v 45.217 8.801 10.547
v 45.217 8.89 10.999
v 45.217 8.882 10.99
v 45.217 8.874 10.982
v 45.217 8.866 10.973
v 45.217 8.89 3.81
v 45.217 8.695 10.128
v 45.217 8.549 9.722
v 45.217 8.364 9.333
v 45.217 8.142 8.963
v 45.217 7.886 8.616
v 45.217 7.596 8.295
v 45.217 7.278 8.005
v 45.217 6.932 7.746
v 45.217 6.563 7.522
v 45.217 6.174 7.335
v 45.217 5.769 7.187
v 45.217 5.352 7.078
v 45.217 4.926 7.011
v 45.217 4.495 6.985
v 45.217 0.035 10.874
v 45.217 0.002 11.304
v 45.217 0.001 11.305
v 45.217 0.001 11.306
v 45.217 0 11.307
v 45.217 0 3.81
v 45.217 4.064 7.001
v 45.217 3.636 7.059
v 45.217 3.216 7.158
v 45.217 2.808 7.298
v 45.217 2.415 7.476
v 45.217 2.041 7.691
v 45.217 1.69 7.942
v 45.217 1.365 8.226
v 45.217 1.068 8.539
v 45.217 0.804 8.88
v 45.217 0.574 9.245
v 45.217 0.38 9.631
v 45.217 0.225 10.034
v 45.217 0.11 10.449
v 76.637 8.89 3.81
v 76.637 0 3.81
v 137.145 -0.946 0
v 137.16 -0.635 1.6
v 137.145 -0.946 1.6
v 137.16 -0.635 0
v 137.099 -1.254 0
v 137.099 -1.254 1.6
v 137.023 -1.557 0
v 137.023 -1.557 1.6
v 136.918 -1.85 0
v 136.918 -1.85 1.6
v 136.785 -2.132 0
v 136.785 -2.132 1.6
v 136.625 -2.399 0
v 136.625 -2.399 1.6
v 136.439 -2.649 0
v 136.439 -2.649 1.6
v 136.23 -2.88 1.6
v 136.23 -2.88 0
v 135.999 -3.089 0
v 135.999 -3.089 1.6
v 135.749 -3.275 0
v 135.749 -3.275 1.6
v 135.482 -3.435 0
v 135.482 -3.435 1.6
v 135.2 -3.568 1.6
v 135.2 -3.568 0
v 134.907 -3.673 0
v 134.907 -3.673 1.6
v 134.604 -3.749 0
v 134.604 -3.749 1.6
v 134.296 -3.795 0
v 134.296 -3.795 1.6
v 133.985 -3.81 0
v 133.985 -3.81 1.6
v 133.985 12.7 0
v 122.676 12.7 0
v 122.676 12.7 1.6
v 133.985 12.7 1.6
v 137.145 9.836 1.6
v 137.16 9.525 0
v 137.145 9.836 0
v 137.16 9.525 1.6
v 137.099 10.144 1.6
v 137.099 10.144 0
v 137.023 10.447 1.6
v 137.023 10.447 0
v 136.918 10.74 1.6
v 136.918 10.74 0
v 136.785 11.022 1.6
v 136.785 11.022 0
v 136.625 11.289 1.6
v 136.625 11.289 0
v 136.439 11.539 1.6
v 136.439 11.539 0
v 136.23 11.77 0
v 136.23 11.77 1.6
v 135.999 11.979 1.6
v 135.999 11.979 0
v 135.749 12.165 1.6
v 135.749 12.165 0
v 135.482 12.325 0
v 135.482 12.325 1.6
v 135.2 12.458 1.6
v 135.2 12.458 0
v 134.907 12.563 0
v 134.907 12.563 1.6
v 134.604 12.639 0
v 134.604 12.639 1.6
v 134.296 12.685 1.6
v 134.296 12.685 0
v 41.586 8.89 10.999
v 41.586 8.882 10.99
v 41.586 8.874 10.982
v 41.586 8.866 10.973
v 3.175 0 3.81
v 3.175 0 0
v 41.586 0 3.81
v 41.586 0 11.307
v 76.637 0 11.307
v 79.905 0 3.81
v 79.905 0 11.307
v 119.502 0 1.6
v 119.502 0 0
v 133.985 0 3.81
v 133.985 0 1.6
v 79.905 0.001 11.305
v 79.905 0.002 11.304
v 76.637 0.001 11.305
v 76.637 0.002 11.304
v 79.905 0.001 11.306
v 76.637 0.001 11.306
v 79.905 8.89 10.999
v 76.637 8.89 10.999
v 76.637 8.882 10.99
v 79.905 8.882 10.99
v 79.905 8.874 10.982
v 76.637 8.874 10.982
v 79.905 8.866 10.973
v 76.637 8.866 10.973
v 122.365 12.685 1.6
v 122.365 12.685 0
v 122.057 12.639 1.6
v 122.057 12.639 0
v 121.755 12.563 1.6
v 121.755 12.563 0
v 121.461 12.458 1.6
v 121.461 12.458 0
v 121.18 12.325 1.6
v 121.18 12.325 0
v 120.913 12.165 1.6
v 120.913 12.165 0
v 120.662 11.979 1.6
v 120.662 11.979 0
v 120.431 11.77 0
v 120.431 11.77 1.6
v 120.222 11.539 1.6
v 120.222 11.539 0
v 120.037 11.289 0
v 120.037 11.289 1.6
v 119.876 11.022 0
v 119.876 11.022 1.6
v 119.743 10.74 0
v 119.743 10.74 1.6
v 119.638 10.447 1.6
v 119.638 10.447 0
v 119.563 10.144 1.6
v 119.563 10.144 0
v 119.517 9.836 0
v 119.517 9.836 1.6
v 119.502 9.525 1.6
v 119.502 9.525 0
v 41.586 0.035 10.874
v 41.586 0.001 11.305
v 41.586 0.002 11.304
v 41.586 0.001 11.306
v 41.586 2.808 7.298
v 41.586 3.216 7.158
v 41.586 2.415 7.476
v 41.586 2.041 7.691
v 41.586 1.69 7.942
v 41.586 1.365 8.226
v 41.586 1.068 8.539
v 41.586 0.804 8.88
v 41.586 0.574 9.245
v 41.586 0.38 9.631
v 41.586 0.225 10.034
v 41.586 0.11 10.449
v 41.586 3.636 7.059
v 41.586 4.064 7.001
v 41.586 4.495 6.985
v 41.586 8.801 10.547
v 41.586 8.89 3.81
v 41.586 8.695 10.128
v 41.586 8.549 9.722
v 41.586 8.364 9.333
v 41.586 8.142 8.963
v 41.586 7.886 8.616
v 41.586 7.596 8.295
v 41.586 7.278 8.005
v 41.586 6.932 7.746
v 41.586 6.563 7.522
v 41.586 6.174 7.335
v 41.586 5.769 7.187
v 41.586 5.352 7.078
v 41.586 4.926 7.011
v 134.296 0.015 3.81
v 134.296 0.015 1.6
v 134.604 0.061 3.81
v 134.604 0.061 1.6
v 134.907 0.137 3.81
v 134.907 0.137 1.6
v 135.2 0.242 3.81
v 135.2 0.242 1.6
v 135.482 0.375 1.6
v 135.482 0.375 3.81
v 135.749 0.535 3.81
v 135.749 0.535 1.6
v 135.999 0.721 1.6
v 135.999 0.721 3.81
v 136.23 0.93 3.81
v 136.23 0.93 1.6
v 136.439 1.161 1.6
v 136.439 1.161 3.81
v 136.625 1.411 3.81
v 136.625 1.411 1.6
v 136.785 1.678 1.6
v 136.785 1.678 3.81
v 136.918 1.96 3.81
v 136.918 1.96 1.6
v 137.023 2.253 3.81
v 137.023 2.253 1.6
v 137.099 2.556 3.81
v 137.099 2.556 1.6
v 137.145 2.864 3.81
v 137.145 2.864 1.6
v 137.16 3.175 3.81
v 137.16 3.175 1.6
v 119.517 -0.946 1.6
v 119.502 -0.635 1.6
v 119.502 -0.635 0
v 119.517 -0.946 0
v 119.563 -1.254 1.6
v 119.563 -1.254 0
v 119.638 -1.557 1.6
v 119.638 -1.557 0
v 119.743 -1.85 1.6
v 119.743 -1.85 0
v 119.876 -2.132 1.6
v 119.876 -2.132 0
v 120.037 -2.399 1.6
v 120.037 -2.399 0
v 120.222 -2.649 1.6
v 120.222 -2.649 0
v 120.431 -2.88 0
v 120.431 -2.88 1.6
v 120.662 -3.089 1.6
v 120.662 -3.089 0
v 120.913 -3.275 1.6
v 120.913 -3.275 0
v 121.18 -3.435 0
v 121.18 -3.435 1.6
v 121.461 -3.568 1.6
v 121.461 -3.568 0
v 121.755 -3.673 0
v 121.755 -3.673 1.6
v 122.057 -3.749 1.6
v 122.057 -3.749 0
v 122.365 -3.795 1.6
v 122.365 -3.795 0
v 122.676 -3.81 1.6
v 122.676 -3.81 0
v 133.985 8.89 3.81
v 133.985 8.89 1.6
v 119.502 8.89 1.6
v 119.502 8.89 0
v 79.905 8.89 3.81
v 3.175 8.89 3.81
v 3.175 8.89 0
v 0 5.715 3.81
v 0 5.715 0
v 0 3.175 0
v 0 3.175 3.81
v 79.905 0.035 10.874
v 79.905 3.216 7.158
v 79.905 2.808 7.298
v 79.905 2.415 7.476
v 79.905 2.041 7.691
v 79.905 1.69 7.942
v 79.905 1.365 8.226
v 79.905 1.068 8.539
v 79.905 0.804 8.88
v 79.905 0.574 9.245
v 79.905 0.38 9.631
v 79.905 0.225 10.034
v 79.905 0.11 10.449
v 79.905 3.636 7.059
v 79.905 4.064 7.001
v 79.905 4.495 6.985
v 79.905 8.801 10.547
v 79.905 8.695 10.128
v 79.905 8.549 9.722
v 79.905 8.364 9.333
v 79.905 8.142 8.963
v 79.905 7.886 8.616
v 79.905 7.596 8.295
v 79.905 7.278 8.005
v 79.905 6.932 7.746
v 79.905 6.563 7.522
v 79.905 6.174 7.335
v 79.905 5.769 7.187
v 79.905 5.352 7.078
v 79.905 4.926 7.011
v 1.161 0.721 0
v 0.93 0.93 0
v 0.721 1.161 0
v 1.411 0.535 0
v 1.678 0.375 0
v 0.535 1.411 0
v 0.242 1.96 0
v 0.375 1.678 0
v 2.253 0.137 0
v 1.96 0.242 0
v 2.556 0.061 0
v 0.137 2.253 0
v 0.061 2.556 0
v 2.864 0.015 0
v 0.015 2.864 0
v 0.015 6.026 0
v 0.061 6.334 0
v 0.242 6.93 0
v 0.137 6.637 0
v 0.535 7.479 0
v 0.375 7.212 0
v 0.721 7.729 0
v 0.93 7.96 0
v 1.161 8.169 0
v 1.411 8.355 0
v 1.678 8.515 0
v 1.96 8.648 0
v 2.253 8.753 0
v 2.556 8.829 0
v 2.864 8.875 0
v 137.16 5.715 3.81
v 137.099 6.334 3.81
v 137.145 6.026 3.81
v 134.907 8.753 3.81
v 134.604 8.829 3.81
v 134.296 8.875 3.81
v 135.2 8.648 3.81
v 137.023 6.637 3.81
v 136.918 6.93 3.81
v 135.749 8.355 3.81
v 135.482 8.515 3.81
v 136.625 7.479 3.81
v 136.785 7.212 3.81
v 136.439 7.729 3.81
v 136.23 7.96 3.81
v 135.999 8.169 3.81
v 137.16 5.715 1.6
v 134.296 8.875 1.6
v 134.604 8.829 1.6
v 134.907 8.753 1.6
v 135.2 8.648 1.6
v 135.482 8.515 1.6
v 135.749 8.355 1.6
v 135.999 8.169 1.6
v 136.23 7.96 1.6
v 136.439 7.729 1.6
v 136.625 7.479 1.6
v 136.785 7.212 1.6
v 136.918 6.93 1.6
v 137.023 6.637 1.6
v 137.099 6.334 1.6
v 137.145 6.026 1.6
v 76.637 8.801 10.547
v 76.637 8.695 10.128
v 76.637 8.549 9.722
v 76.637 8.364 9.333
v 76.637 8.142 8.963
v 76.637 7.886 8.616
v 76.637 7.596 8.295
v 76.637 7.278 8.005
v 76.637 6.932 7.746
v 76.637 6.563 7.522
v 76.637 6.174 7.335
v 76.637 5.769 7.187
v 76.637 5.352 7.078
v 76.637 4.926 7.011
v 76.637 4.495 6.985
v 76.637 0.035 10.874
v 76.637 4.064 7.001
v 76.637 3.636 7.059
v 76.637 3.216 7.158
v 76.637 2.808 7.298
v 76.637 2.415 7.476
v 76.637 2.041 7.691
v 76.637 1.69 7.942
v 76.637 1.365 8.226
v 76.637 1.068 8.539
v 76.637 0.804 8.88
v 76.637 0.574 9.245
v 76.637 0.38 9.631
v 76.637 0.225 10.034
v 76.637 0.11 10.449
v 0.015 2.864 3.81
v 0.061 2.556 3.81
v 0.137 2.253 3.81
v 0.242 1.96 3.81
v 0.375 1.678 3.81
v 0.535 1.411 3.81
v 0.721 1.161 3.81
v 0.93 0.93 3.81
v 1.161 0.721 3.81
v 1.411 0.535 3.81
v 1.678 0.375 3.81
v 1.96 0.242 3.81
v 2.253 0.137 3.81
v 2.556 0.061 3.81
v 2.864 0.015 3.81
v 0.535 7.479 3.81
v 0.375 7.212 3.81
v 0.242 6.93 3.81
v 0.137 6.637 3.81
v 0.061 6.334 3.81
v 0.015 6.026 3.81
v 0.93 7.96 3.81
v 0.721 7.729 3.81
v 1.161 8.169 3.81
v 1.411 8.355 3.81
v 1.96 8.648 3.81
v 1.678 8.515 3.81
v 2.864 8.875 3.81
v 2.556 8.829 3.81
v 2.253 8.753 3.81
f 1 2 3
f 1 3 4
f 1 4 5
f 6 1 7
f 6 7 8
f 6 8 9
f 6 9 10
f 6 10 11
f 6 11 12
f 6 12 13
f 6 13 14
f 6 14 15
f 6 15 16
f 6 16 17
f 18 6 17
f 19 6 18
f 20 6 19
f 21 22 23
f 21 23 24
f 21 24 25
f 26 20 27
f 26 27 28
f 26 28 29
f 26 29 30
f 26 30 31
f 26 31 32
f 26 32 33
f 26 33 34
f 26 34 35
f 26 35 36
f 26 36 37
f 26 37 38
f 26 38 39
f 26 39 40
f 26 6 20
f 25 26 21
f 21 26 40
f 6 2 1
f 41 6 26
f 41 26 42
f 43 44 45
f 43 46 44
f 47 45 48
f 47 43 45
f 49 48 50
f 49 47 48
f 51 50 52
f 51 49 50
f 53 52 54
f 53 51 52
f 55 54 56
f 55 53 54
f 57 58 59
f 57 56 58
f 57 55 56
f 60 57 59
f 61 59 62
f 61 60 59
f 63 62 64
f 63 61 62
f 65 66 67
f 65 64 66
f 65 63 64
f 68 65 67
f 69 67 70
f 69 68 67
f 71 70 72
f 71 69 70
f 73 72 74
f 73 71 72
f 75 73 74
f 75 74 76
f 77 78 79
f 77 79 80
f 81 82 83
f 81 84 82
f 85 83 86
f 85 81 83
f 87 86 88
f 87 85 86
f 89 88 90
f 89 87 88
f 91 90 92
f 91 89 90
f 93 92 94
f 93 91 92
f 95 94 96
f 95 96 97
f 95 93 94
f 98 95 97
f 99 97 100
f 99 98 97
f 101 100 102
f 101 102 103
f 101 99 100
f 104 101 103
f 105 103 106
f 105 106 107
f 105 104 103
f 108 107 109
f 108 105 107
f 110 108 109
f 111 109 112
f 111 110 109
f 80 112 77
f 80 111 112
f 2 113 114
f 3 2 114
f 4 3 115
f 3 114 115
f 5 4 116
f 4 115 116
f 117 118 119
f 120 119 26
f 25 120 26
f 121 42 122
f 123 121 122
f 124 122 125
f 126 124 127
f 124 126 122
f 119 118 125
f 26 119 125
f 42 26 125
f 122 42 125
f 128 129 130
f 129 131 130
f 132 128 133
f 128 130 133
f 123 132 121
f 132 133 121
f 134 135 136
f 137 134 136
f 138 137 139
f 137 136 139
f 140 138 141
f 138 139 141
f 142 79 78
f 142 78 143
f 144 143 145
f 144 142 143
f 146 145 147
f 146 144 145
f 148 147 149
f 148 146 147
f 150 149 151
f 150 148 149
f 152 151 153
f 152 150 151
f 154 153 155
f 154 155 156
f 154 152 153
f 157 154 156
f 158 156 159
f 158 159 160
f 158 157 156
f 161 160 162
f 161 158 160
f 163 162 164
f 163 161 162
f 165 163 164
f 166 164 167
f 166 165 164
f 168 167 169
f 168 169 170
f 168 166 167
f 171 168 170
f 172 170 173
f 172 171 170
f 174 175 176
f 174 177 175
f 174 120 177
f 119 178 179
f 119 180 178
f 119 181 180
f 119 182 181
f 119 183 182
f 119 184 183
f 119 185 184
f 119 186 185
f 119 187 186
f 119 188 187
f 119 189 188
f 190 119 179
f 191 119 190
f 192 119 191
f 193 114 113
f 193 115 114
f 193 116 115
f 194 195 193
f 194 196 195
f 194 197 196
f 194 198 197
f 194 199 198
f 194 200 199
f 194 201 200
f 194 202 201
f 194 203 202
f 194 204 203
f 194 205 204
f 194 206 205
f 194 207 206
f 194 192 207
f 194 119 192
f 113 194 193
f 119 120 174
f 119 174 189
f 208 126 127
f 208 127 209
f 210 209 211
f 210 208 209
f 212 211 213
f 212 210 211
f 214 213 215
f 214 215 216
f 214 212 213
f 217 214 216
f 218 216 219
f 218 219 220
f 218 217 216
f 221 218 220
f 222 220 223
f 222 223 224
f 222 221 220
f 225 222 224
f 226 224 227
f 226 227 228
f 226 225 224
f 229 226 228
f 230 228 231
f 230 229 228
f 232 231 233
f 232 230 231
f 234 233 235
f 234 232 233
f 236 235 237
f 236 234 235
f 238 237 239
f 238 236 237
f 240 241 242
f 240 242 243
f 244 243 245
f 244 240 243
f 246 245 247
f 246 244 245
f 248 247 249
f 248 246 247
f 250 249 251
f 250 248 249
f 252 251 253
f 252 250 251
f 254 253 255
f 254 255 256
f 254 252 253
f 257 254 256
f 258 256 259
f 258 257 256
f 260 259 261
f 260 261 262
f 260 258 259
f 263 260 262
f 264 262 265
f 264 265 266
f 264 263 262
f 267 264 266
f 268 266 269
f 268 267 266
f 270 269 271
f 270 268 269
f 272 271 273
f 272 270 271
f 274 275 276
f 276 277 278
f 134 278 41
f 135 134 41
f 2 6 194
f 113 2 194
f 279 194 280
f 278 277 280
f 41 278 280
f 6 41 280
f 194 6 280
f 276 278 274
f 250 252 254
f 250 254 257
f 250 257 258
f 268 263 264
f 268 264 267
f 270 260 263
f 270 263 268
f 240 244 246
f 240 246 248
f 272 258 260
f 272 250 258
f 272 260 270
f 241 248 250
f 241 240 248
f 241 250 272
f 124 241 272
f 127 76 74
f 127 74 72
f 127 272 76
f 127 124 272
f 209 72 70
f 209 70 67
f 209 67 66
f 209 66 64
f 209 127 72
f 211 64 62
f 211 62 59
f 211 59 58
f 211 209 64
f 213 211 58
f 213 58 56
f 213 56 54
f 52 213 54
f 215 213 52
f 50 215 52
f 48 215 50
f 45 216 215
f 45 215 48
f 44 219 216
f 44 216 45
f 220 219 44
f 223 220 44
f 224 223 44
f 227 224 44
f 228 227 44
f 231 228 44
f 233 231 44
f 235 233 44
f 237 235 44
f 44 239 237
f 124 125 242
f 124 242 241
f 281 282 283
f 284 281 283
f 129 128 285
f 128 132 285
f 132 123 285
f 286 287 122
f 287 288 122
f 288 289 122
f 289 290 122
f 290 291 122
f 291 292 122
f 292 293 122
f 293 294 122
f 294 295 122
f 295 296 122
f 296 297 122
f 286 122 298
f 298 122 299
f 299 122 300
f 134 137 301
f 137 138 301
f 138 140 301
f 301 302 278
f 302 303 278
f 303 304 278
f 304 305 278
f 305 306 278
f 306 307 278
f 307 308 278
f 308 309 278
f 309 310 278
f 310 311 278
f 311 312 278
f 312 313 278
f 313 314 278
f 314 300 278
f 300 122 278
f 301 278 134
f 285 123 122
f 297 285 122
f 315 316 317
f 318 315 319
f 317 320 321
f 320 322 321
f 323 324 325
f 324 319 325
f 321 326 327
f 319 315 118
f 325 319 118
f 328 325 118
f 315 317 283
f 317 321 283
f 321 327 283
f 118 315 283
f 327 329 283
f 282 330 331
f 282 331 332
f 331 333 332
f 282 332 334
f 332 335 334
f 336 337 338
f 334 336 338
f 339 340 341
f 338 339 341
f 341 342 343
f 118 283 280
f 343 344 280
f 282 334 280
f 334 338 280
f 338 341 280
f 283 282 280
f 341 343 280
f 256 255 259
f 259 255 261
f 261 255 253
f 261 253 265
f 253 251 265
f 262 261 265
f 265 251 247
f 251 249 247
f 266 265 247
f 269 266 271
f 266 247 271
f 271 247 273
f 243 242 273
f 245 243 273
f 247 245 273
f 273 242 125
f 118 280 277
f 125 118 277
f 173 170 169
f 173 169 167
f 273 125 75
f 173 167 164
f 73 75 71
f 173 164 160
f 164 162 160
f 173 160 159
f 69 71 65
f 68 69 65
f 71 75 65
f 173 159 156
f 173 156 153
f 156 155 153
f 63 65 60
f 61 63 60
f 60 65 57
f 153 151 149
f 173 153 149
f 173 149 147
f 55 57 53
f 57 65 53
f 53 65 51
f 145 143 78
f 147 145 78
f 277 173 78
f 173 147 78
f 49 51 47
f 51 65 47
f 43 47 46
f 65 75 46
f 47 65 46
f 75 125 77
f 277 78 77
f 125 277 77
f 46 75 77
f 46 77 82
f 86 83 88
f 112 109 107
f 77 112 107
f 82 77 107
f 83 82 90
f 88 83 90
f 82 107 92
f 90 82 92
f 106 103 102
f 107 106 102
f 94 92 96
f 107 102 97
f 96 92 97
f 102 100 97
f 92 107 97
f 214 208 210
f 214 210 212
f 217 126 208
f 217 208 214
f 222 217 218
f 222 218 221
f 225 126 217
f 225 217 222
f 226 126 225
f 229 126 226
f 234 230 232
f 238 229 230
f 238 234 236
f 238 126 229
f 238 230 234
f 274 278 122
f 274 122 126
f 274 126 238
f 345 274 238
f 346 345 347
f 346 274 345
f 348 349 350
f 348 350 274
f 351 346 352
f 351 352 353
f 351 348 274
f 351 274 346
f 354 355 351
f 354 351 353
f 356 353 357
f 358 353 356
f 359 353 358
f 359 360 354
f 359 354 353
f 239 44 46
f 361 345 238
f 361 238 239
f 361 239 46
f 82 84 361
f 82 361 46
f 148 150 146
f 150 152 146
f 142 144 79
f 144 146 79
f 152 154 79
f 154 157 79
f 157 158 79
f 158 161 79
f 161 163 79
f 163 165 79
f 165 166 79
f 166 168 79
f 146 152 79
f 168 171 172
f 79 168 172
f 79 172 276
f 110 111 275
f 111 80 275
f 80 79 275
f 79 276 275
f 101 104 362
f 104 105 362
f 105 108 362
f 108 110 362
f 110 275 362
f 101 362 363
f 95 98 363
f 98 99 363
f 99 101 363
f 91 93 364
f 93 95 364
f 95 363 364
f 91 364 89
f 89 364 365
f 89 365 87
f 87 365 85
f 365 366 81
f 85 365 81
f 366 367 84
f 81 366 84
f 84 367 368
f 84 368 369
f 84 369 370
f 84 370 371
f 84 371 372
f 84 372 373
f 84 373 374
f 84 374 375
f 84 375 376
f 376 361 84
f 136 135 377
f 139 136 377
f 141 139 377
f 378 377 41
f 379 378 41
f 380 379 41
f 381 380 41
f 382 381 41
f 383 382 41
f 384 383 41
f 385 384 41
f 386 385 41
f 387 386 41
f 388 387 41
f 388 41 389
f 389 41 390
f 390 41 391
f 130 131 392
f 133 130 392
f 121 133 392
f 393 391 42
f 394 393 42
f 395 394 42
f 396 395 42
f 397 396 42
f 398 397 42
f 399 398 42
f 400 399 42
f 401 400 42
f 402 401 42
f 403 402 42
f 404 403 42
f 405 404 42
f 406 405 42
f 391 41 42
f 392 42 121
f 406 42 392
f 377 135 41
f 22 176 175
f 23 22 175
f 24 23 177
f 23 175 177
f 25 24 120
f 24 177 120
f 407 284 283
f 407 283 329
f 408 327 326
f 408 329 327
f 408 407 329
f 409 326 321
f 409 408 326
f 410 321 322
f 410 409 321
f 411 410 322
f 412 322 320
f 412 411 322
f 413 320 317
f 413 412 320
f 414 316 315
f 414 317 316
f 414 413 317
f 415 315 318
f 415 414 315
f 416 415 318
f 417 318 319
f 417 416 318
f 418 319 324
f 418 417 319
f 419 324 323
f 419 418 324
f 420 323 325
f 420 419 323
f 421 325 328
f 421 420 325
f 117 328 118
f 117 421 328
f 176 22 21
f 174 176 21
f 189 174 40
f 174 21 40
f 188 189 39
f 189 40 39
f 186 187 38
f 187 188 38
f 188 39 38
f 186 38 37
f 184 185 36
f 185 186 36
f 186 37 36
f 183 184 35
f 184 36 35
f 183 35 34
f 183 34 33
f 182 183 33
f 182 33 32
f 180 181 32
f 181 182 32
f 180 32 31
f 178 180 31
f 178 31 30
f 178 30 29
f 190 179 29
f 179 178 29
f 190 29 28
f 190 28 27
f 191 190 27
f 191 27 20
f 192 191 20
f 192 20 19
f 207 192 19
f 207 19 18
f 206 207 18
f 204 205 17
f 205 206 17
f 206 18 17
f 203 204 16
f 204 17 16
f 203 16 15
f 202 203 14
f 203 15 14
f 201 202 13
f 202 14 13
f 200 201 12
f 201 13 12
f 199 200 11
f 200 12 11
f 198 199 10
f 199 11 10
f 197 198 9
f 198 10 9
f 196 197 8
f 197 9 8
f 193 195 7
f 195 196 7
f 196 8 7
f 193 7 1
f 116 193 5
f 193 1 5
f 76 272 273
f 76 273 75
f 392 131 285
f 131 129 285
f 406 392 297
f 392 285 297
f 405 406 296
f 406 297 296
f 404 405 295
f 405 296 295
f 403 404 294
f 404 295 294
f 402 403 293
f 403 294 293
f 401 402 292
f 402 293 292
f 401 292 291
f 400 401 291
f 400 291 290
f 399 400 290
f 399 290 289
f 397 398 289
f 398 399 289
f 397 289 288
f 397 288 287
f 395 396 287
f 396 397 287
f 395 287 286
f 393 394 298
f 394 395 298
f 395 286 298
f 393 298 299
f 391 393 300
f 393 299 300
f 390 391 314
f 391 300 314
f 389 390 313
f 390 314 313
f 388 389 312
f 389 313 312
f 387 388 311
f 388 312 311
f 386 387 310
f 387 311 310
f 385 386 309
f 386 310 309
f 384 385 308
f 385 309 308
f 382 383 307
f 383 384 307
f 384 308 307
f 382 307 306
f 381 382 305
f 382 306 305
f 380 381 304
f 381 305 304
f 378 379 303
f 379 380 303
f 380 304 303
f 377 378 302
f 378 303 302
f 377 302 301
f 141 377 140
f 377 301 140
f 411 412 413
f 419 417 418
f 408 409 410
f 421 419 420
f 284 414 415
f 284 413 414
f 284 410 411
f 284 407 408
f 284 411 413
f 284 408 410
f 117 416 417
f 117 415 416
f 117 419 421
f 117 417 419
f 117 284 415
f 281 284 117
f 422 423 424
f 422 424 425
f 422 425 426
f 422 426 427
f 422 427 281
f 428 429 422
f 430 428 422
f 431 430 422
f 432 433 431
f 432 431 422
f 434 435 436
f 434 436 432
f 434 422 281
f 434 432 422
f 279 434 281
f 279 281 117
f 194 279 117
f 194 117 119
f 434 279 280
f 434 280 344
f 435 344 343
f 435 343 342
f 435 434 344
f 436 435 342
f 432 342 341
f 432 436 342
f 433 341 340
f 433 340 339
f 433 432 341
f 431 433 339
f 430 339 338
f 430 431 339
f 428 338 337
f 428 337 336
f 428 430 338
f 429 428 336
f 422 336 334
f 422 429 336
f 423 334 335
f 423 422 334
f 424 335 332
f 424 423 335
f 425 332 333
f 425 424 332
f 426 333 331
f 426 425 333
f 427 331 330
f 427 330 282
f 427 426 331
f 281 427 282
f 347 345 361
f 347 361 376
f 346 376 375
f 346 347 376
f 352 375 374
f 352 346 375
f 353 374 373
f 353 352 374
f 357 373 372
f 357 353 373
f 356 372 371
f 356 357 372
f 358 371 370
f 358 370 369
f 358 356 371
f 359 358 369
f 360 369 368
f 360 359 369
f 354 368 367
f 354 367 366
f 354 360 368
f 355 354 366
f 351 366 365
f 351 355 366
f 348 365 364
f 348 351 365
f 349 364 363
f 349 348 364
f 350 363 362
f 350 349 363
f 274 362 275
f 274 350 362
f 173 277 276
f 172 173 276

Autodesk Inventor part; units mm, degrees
ref_plane "YZ Plane" through (0, 0, 0) normal (1, 0, 0) x (0, 1, 0)
ref_plane "XZ Plane" through (0, 0, 0) normal (0, 1, 0) x (-1, 0, 0)
ref_plane "XY Plane" through (0, 0, 0) normal (0, 0, 1) x (1, 0, 0)
sketch "Sketch1" plane through (0, 0, 0) normal (0, 0, 1) x (1, 0, 0)
  point P0 (0, 0)
sketch "Sketch2" plane through (0, 0, 0) normal (0, 0, 1) x (1, 0, 0)
  line L0 (0, 0) -> (137.16, 0)
  line L1 (137.16, 0) -> (137.16, 8.89)
  line L2 (137.16, 8.89) -> (0, 8.89)
  line L3 (0, 8.89) -> (0, 0)
  dimension "d0" = 137.16
  dimension "d3" = 8.89
extrude "Extrusion1" add sketch "Sketch2" along normal blind 3.81
sketch "Sketch3" plane through (0, 8.89, 0) normal (0, 1, 0) x (1, 0, 0)
  line L0 (137.16, 0) -> (137.16, -3.81) projected
  line L1 (137.16, 0) -> (119.5015, 0)
  line L2 (119.5015, 0) -> (119.5015, -1.6003)
  line L3 (119.5015, -1.6003) -> (137.16, -1.6003)
  line L4 (137.16, -1.6003) -> (137.16, 0)
  point P0 (0, 0)
extrude "Extrusion2" add sketch "Sketch3" along normal blind 3.81
sketch "Sketch4" plane through (0, 0, 0) normal (0, -1, 0) x (1, 0, 0)
  line L0 (0, 0) -> (137.16, 0) projected
  line L1 (119.5015, 1.6003) -> (137.16, 1.6003) projected
  line L2 (137.16, 0) -> (119.5015, 0)
  line L3 (119.5015, 0) -> (119.5015, 1.6003)
  line L4 (119.5015, 1.6003) -> (137.16, 1.6003)
  line L5 (137.16, 1.6003) -> (137.16, 0)
extrude "Extrusion3" add sketch "Sketch4" along normal blind 3.81
sketch "Sketch6" plane through (0, 0, 3.81) normal (0, 0, 1) x (1, 0, 0)
  line L0 (119.5015, 8.89) -> (0, 8.89) projected
  line L1 (0, 0) -> (119.5015, 0) projected
  line L2 (79.905, 8.89) -> (76.6366, 8.89)
  line L3 (76.6366, 8.89) -> (76.6366, 0)
  line L4 (76.6366, 0) -> (79.905, 0)
  line L5 (79.905, 0) -> (79.905, 8.89)
  dimension "d28" = 119.5015
extrude "Extrusion5" add sketch "Sketch6" along normal blind 7.62
sketch "Sketch7" plane through (79.905, 0, 3.81) normal (1, 0, 0) x (0, 0, -1)
  line L0 (-7.62, 0) -> (-7.62, 8.89) projected
  circle A0 centre (-7.62, 4.445) radius 4.445
  point P0 (3.81, 0)
extrude "Extrusion6" cut sketch "Sketch7" against normal blind 12.7
sketch "Sketch8" plane through (0, 0, 3.81) normal (0, 0, 1) x (1, 0, 0)
  line L0 (0, 0) -> (119.5015, 0) projected
  line L1 (119.5015, 8.89) -> (0, 8.89) projected
  line L2 (45.2172, 0) -> (41.5862, 0)
  line L3 (41.5862, 0) -> (41.5862, 8.89)
  line L4 (41.5862, 8.89) -> (45.2172, 8.89)
  line L5 (45.2172, 8.89) -> (45.2172, 0)
extrude "Extrusion7" add sketch "Sketch8" along normal blind 12.7
fillet "Fillet3" radius 3.175 8 edges at (0, 0, 1.905) (0, 8.89, 1.905) (137.16, 0, 2.7052) (137.16, 8.89, 2.7052) (137.16, -3.81, 0.8002) (137.16, 12.7, 0.8002) (119.5015, -3.81, 0.8002) (119.5015, 12.7, 0.8002)
extrude "Extrusion8" cut sketch "Sketch7" against normal through all
sketch "Sketch9" plane through (41.5862, 0, 16.51) normal (-1, 0, 0) x (0, 0, 1)
  circle A0 centre (-1.585, 4.5756) radius 5.8334
  point P0 (-16.51, 0)
extrude "Extrusion9" cut sketch "Sketch9" against normal through all
properties part number "stweet"
